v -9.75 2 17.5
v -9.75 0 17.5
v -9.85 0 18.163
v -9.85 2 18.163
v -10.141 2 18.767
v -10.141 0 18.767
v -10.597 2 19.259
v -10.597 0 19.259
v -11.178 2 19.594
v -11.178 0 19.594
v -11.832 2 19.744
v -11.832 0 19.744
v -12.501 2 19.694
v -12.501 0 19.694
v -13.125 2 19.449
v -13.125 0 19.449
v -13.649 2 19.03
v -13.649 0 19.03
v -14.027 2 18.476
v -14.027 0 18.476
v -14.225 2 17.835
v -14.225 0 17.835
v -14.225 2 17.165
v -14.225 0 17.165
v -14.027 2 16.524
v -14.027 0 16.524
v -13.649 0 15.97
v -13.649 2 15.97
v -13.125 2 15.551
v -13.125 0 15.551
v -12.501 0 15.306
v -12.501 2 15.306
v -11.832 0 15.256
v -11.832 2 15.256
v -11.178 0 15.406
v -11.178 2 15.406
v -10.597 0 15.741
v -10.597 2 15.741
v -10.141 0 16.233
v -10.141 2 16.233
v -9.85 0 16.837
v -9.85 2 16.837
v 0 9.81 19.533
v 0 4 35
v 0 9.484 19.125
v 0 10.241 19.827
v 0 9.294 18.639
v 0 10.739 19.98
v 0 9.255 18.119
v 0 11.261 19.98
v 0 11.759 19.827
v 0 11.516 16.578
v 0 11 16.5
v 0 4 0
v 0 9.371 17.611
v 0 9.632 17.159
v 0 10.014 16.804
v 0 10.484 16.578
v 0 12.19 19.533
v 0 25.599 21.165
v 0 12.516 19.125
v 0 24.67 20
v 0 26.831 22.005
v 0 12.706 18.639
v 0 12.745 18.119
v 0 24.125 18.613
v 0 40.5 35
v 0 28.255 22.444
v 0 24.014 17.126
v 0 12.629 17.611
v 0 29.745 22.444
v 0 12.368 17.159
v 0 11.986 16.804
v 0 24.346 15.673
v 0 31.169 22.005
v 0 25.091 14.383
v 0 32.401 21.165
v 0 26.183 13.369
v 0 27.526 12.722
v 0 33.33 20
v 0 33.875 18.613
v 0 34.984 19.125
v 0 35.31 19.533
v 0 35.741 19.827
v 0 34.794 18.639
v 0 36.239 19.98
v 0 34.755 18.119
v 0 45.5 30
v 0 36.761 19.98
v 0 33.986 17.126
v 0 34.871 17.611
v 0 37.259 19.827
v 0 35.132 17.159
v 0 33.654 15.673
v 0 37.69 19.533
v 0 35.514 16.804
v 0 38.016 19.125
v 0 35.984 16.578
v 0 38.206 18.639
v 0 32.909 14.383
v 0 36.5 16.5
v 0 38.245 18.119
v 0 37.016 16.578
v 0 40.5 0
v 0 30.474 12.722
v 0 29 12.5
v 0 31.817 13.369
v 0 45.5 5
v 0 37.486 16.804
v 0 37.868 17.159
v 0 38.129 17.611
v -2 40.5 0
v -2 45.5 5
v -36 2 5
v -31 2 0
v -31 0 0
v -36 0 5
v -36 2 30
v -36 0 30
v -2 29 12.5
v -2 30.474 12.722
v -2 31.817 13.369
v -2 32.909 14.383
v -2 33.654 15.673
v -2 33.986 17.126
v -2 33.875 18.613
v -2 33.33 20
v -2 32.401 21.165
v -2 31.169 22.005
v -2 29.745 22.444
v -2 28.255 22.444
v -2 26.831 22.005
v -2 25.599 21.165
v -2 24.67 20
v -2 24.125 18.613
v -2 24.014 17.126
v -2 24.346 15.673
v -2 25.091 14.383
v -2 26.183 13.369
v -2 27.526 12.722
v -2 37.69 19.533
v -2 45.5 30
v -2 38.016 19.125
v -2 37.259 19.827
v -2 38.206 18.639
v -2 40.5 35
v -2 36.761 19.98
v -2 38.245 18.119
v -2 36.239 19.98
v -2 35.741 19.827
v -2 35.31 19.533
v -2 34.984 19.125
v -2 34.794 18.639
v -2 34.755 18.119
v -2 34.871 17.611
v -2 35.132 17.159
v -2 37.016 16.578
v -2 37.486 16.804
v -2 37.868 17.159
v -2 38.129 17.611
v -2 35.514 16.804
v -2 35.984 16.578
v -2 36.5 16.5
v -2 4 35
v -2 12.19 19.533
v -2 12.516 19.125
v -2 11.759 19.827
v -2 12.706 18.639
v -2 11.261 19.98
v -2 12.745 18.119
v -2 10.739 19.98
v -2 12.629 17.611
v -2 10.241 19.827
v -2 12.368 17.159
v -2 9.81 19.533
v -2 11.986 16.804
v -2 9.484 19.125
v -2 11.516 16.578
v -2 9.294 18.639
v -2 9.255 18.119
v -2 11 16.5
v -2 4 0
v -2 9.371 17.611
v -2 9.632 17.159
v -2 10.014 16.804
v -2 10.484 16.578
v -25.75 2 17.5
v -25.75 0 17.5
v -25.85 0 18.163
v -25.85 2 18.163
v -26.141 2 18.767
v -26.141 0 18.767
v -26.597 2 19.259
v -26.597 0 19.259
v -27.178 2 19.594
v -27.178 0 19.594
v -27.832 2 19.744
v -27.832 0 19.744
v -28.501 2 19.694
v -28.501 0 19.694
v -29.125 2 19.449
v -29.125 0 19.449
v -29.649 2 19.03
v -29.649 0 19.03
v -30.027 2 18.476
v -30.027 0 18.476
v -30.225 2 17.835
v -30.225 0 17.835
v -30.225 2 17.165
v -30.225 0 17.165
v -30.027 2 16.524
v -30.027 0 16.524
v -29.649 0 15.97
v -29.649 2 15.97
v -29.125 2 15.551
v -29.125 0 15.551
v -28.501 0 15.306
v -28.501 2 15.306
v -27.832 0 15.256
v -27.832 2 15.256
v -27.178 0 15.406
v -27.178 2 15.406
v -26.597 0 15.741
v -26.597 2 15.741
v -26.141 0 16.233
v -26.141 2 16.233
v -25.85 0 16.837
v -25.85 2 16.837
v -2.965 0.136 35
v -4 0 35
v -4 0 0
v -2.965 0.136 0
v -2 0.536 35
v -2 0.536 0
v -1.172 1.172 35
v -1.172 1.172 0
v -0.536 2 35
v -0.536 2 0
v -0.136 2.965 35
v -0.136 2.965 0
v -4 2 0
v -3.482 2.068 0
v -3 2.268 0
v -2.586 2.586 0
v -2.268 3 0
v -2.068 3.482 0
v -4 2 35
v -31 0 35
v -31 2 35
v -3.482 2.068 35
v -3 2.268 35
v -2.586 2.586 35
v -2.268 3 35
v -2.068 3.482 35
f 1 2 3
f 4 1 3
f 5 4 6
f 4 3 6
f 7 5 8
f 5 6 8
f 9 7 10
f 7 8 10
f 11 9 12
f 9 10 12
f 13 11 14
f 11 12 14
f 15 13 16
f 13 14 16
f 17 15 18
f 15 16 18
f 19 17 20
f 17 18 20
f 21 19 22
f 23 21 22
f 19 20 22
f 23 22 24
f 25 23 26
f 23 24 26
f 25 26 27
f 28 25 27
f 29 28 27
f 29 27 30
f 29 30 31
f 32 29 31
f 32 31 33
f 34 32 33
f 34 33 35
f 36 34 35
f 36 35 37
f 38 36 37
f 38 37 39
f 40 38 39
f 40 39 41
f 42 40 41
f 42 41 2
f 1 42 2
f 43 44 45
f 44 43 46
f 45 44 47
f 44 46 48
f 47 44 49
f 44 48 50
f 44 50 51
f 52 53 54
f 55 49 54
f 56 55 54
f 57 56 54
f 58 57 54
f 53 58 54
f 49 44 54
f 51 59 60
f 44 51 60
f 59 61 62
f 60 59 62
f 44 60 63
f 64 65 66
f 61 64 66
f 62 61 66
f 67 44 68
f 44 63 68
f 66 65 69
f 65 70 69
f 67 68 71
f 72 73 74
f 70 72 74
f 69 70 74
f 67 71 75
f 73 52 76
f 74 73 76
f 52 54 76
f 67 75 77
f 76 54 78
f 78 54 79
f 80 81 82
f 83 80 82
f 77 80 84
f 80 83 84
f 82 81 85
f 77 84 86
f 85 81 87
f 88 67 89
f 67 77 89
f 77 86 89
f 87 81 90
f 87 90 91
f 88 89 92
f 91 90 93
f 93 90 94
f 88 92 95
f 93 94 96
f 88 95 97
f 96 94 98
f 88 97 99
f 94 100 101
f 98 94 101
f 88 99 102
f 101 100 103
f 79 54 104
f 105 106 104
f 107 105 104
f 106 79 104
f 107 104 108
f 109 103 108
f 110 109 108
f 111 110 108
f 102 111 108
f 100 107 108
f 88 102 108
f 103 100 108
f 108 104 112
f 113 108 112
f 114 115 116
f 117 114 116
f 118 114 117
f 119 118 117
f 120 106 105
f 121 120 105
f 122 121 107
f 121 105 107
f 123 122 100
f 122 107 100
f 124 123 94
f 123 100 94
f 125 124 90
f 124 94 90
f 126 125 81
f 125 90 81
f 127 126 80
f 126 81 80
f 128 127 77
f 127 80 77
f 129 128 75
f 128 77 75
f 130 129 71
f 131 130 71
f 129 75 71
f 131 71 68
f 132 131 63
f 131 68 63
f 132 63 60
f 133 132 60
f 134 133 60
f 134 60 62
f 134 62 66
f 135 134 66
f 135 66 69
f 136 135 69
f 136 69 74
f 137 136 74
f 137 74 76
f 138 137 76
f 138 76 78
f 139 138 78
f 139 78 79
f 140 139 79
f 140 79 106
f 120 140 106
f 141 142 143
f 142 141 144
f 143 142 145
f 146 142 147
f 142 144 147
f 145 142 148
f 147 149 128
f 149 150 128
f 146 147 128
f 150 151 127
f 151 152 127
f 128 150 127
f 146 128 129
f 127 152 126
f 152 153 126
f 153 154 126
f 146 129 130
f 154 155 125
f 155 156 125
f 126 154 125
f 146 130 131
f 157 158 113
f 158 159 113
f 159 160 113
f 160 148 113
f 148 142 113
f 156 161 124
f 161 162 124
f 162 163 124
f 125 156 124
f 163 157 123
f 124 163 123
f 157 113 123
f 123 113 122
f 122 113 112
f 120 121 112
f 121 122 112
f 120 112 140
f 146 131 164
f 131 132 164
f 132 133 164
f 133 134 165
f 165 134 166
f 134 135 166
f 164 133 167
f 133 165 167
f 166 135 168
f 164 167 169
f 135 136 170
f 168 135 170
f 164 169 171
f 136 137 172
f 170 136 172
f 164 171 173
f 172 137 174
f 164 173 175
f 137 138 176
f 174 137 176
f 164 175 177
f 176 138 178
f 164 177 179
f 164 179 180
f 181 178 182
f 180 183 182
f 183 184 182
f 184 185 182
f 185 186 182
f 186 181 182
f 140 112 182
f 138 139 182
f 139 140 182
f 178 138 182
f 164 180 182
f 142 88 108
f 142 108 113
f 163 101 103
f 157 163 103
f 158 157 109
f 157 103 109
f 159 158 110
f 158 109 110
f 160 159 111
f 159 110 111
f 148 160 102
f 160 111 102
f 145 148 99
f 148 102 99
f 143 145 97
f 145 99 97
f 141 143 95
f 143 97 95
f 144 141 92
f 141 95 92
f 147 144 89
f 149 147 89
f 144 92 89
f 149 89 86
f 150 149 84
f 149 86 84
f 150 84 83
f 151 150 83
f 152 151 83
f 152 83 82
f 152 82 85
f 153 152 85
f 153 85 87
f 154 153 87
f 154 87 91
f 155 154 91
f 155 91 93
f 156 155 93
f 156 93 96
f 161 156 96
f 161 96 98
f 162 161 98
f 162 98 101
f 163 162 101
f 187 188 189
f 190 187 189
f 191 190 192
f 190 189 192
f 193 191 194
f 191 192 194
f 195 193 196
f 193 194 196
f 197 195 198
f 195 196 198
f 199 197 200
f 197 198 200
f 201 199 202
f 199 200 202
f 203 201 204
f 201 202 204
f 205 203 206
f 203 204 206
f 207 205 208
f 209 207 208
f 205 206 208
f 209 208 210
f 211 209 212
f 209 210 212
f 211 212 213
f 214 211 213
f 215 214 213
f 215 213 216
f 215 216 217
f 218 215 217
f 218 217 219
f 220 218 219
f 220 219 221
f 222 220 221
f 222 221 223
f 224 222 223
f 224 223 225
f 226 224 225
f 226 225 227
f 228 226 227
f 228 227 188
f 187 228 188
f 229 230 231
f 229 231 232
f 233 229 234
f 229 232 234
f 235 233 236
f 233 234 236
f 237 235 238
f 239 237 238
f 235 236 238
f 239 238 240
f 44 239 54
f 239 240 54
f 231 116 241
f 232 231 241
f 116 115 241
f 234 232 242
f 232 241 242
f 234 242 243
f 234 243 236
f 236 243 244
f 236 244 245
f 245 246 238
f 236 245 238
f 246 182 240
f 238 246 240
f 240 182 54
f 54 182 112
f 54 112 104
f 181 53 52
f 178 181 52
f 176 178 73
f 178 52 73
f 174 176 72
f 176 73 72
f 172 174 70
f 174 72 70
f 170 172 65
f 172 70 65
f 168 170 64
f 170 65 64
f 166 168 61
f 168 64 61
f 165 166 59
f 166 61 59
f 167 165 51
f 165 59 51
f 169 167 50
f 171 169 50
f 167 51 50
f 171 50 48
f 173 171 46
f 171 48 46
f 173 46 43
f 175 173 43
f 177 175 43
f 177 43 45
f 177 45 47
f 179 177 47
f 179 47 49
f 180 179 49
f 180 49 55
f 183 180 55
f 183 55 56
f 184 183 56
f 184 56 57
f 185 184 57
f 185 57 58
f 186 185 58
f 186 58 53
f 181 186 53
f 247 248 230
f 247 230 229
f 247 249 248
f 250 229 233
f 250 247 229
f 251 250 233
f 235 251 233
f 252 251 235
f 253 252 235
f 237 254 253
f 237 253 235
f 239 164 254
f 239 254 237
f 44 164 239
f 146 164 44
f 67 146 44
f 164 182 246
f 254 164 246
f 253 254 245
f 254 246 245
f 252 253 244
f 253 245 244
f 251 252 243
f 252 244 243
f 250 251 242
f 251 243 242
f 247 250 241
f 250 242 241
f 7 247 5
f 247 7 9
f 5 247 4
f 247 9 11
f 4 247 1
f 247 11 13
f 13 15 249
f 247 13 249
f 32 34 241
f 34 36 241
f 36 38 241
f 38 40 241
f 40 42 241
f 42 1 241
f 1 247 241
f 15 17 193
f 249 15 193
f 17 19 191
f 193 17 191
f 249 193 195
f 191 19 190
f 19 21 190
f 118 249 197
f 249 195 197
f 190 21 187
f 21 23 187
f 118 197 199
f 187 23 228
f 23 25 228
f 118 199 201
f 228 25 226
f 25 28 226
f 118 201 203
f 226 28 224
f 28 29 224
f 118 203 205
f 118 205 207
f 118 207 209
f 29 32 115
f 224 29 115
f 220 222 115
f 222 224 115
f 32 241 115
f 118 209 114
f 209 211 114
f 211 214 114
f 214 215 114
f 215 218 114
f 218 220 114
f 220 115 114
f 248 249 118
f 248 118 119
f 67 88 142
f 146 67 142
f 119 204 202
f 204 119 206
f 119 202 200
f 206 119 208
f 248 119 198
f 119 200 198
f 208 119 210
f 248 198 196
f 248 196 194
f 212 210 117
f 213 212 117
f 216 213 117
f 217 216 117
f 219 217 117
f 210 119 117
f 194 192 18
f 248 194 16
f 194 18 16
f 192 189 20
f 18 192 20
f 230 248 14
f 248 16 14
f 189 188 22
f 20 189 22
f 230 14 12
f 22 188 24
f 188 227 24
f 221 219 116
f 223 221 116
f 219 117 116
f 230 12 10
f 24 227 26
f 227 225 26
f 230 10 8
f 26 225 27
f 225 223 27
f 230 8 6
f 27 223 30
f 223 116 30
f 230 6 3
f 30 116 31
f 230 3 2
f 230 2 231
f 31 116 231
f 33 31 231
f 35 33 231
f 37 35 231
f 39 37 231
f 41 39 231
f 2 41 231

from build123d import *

# Parameters (mm, degrees)
BASE_FLANGE1_DEPTH = 35
SKETCH3_R          = 5
SKETCH3_R_2        = 1.75
CUT_EXTRUDE1_DEPTH = 10
CHAMFER1_SIZE      = 5
SKETCH4_R          = 2.25
CUT_EXTRUDE2_DEPTH = 10


# Sheet-metal steps are written as plain solids
with BuildPart() as part:
    # Sketch1 → Base-Flange1 (new body)
    with BuildSketch(Plane.XY):
        with BuildLine():
            Line((-36, 0), (-4, 0))
            ThreePointArc((-4, 0), (-1.171572875, 1.171572875), (0, 4))
            Line((0, 4), (0, 45.5))
            Line((0, 45.5), (-2, 45.5))
            Line((-2, 45.5), (-2, 4))
            ThreePointArc((-2, 4), (-2.585786438, 2.585786438), (-4, 2))
            Line((-4, 2), (-36, 2))
            Line((-36, 2), (-36, 0))
        make_face()
    extrude(amount=BASE_FLANGE1_DEPTH)

    # Sketch3 → Cut-Extrude1 (cut)
    with BuildSketch(Plane(origin=(0, 0, 0), x_dir=(0, 0, -1), z_dir=(1, 0, 0))):
        with Locations((-17.5, 29)):
            Circle(SKETCH3_R)
        with Locations((-18.25, 11)):
            Circle(SKETCH3_R_2)
        with Locations((-18.25, 36.5)):
            Circle(SKETCH3_R_2)
    extrude(amount=-CUT_EXTRUDE1_DEPTH, mode=Mode.SUBTRACT)

    # Chamfer1
    chamfer1_edges = [part.edges().sort_by_distance(p)[0] for p in [
        (-1, 45.5, 35),
        (-36, 1, 35),
        (-1, 45.5, 0),
        (-36, 1, 0),
    ]]
    chamfer(chamfer1_edges, length=CHAMFER1_SIZE)

    # Sketch4 → Cut-Extrude2 (cut)
    with BuildSketch(Plane.XZ):
        with Locations((-28, 17.5)):
            Circle(SKETCH4_R)
        with Locations((-12, 17.5)):
            Circle(SKETCH4_R)
    extrude(amount=-CUT_EXTRUDE2_DEPTH, mode=Mode.SUBTRACT)


solid = part.part
